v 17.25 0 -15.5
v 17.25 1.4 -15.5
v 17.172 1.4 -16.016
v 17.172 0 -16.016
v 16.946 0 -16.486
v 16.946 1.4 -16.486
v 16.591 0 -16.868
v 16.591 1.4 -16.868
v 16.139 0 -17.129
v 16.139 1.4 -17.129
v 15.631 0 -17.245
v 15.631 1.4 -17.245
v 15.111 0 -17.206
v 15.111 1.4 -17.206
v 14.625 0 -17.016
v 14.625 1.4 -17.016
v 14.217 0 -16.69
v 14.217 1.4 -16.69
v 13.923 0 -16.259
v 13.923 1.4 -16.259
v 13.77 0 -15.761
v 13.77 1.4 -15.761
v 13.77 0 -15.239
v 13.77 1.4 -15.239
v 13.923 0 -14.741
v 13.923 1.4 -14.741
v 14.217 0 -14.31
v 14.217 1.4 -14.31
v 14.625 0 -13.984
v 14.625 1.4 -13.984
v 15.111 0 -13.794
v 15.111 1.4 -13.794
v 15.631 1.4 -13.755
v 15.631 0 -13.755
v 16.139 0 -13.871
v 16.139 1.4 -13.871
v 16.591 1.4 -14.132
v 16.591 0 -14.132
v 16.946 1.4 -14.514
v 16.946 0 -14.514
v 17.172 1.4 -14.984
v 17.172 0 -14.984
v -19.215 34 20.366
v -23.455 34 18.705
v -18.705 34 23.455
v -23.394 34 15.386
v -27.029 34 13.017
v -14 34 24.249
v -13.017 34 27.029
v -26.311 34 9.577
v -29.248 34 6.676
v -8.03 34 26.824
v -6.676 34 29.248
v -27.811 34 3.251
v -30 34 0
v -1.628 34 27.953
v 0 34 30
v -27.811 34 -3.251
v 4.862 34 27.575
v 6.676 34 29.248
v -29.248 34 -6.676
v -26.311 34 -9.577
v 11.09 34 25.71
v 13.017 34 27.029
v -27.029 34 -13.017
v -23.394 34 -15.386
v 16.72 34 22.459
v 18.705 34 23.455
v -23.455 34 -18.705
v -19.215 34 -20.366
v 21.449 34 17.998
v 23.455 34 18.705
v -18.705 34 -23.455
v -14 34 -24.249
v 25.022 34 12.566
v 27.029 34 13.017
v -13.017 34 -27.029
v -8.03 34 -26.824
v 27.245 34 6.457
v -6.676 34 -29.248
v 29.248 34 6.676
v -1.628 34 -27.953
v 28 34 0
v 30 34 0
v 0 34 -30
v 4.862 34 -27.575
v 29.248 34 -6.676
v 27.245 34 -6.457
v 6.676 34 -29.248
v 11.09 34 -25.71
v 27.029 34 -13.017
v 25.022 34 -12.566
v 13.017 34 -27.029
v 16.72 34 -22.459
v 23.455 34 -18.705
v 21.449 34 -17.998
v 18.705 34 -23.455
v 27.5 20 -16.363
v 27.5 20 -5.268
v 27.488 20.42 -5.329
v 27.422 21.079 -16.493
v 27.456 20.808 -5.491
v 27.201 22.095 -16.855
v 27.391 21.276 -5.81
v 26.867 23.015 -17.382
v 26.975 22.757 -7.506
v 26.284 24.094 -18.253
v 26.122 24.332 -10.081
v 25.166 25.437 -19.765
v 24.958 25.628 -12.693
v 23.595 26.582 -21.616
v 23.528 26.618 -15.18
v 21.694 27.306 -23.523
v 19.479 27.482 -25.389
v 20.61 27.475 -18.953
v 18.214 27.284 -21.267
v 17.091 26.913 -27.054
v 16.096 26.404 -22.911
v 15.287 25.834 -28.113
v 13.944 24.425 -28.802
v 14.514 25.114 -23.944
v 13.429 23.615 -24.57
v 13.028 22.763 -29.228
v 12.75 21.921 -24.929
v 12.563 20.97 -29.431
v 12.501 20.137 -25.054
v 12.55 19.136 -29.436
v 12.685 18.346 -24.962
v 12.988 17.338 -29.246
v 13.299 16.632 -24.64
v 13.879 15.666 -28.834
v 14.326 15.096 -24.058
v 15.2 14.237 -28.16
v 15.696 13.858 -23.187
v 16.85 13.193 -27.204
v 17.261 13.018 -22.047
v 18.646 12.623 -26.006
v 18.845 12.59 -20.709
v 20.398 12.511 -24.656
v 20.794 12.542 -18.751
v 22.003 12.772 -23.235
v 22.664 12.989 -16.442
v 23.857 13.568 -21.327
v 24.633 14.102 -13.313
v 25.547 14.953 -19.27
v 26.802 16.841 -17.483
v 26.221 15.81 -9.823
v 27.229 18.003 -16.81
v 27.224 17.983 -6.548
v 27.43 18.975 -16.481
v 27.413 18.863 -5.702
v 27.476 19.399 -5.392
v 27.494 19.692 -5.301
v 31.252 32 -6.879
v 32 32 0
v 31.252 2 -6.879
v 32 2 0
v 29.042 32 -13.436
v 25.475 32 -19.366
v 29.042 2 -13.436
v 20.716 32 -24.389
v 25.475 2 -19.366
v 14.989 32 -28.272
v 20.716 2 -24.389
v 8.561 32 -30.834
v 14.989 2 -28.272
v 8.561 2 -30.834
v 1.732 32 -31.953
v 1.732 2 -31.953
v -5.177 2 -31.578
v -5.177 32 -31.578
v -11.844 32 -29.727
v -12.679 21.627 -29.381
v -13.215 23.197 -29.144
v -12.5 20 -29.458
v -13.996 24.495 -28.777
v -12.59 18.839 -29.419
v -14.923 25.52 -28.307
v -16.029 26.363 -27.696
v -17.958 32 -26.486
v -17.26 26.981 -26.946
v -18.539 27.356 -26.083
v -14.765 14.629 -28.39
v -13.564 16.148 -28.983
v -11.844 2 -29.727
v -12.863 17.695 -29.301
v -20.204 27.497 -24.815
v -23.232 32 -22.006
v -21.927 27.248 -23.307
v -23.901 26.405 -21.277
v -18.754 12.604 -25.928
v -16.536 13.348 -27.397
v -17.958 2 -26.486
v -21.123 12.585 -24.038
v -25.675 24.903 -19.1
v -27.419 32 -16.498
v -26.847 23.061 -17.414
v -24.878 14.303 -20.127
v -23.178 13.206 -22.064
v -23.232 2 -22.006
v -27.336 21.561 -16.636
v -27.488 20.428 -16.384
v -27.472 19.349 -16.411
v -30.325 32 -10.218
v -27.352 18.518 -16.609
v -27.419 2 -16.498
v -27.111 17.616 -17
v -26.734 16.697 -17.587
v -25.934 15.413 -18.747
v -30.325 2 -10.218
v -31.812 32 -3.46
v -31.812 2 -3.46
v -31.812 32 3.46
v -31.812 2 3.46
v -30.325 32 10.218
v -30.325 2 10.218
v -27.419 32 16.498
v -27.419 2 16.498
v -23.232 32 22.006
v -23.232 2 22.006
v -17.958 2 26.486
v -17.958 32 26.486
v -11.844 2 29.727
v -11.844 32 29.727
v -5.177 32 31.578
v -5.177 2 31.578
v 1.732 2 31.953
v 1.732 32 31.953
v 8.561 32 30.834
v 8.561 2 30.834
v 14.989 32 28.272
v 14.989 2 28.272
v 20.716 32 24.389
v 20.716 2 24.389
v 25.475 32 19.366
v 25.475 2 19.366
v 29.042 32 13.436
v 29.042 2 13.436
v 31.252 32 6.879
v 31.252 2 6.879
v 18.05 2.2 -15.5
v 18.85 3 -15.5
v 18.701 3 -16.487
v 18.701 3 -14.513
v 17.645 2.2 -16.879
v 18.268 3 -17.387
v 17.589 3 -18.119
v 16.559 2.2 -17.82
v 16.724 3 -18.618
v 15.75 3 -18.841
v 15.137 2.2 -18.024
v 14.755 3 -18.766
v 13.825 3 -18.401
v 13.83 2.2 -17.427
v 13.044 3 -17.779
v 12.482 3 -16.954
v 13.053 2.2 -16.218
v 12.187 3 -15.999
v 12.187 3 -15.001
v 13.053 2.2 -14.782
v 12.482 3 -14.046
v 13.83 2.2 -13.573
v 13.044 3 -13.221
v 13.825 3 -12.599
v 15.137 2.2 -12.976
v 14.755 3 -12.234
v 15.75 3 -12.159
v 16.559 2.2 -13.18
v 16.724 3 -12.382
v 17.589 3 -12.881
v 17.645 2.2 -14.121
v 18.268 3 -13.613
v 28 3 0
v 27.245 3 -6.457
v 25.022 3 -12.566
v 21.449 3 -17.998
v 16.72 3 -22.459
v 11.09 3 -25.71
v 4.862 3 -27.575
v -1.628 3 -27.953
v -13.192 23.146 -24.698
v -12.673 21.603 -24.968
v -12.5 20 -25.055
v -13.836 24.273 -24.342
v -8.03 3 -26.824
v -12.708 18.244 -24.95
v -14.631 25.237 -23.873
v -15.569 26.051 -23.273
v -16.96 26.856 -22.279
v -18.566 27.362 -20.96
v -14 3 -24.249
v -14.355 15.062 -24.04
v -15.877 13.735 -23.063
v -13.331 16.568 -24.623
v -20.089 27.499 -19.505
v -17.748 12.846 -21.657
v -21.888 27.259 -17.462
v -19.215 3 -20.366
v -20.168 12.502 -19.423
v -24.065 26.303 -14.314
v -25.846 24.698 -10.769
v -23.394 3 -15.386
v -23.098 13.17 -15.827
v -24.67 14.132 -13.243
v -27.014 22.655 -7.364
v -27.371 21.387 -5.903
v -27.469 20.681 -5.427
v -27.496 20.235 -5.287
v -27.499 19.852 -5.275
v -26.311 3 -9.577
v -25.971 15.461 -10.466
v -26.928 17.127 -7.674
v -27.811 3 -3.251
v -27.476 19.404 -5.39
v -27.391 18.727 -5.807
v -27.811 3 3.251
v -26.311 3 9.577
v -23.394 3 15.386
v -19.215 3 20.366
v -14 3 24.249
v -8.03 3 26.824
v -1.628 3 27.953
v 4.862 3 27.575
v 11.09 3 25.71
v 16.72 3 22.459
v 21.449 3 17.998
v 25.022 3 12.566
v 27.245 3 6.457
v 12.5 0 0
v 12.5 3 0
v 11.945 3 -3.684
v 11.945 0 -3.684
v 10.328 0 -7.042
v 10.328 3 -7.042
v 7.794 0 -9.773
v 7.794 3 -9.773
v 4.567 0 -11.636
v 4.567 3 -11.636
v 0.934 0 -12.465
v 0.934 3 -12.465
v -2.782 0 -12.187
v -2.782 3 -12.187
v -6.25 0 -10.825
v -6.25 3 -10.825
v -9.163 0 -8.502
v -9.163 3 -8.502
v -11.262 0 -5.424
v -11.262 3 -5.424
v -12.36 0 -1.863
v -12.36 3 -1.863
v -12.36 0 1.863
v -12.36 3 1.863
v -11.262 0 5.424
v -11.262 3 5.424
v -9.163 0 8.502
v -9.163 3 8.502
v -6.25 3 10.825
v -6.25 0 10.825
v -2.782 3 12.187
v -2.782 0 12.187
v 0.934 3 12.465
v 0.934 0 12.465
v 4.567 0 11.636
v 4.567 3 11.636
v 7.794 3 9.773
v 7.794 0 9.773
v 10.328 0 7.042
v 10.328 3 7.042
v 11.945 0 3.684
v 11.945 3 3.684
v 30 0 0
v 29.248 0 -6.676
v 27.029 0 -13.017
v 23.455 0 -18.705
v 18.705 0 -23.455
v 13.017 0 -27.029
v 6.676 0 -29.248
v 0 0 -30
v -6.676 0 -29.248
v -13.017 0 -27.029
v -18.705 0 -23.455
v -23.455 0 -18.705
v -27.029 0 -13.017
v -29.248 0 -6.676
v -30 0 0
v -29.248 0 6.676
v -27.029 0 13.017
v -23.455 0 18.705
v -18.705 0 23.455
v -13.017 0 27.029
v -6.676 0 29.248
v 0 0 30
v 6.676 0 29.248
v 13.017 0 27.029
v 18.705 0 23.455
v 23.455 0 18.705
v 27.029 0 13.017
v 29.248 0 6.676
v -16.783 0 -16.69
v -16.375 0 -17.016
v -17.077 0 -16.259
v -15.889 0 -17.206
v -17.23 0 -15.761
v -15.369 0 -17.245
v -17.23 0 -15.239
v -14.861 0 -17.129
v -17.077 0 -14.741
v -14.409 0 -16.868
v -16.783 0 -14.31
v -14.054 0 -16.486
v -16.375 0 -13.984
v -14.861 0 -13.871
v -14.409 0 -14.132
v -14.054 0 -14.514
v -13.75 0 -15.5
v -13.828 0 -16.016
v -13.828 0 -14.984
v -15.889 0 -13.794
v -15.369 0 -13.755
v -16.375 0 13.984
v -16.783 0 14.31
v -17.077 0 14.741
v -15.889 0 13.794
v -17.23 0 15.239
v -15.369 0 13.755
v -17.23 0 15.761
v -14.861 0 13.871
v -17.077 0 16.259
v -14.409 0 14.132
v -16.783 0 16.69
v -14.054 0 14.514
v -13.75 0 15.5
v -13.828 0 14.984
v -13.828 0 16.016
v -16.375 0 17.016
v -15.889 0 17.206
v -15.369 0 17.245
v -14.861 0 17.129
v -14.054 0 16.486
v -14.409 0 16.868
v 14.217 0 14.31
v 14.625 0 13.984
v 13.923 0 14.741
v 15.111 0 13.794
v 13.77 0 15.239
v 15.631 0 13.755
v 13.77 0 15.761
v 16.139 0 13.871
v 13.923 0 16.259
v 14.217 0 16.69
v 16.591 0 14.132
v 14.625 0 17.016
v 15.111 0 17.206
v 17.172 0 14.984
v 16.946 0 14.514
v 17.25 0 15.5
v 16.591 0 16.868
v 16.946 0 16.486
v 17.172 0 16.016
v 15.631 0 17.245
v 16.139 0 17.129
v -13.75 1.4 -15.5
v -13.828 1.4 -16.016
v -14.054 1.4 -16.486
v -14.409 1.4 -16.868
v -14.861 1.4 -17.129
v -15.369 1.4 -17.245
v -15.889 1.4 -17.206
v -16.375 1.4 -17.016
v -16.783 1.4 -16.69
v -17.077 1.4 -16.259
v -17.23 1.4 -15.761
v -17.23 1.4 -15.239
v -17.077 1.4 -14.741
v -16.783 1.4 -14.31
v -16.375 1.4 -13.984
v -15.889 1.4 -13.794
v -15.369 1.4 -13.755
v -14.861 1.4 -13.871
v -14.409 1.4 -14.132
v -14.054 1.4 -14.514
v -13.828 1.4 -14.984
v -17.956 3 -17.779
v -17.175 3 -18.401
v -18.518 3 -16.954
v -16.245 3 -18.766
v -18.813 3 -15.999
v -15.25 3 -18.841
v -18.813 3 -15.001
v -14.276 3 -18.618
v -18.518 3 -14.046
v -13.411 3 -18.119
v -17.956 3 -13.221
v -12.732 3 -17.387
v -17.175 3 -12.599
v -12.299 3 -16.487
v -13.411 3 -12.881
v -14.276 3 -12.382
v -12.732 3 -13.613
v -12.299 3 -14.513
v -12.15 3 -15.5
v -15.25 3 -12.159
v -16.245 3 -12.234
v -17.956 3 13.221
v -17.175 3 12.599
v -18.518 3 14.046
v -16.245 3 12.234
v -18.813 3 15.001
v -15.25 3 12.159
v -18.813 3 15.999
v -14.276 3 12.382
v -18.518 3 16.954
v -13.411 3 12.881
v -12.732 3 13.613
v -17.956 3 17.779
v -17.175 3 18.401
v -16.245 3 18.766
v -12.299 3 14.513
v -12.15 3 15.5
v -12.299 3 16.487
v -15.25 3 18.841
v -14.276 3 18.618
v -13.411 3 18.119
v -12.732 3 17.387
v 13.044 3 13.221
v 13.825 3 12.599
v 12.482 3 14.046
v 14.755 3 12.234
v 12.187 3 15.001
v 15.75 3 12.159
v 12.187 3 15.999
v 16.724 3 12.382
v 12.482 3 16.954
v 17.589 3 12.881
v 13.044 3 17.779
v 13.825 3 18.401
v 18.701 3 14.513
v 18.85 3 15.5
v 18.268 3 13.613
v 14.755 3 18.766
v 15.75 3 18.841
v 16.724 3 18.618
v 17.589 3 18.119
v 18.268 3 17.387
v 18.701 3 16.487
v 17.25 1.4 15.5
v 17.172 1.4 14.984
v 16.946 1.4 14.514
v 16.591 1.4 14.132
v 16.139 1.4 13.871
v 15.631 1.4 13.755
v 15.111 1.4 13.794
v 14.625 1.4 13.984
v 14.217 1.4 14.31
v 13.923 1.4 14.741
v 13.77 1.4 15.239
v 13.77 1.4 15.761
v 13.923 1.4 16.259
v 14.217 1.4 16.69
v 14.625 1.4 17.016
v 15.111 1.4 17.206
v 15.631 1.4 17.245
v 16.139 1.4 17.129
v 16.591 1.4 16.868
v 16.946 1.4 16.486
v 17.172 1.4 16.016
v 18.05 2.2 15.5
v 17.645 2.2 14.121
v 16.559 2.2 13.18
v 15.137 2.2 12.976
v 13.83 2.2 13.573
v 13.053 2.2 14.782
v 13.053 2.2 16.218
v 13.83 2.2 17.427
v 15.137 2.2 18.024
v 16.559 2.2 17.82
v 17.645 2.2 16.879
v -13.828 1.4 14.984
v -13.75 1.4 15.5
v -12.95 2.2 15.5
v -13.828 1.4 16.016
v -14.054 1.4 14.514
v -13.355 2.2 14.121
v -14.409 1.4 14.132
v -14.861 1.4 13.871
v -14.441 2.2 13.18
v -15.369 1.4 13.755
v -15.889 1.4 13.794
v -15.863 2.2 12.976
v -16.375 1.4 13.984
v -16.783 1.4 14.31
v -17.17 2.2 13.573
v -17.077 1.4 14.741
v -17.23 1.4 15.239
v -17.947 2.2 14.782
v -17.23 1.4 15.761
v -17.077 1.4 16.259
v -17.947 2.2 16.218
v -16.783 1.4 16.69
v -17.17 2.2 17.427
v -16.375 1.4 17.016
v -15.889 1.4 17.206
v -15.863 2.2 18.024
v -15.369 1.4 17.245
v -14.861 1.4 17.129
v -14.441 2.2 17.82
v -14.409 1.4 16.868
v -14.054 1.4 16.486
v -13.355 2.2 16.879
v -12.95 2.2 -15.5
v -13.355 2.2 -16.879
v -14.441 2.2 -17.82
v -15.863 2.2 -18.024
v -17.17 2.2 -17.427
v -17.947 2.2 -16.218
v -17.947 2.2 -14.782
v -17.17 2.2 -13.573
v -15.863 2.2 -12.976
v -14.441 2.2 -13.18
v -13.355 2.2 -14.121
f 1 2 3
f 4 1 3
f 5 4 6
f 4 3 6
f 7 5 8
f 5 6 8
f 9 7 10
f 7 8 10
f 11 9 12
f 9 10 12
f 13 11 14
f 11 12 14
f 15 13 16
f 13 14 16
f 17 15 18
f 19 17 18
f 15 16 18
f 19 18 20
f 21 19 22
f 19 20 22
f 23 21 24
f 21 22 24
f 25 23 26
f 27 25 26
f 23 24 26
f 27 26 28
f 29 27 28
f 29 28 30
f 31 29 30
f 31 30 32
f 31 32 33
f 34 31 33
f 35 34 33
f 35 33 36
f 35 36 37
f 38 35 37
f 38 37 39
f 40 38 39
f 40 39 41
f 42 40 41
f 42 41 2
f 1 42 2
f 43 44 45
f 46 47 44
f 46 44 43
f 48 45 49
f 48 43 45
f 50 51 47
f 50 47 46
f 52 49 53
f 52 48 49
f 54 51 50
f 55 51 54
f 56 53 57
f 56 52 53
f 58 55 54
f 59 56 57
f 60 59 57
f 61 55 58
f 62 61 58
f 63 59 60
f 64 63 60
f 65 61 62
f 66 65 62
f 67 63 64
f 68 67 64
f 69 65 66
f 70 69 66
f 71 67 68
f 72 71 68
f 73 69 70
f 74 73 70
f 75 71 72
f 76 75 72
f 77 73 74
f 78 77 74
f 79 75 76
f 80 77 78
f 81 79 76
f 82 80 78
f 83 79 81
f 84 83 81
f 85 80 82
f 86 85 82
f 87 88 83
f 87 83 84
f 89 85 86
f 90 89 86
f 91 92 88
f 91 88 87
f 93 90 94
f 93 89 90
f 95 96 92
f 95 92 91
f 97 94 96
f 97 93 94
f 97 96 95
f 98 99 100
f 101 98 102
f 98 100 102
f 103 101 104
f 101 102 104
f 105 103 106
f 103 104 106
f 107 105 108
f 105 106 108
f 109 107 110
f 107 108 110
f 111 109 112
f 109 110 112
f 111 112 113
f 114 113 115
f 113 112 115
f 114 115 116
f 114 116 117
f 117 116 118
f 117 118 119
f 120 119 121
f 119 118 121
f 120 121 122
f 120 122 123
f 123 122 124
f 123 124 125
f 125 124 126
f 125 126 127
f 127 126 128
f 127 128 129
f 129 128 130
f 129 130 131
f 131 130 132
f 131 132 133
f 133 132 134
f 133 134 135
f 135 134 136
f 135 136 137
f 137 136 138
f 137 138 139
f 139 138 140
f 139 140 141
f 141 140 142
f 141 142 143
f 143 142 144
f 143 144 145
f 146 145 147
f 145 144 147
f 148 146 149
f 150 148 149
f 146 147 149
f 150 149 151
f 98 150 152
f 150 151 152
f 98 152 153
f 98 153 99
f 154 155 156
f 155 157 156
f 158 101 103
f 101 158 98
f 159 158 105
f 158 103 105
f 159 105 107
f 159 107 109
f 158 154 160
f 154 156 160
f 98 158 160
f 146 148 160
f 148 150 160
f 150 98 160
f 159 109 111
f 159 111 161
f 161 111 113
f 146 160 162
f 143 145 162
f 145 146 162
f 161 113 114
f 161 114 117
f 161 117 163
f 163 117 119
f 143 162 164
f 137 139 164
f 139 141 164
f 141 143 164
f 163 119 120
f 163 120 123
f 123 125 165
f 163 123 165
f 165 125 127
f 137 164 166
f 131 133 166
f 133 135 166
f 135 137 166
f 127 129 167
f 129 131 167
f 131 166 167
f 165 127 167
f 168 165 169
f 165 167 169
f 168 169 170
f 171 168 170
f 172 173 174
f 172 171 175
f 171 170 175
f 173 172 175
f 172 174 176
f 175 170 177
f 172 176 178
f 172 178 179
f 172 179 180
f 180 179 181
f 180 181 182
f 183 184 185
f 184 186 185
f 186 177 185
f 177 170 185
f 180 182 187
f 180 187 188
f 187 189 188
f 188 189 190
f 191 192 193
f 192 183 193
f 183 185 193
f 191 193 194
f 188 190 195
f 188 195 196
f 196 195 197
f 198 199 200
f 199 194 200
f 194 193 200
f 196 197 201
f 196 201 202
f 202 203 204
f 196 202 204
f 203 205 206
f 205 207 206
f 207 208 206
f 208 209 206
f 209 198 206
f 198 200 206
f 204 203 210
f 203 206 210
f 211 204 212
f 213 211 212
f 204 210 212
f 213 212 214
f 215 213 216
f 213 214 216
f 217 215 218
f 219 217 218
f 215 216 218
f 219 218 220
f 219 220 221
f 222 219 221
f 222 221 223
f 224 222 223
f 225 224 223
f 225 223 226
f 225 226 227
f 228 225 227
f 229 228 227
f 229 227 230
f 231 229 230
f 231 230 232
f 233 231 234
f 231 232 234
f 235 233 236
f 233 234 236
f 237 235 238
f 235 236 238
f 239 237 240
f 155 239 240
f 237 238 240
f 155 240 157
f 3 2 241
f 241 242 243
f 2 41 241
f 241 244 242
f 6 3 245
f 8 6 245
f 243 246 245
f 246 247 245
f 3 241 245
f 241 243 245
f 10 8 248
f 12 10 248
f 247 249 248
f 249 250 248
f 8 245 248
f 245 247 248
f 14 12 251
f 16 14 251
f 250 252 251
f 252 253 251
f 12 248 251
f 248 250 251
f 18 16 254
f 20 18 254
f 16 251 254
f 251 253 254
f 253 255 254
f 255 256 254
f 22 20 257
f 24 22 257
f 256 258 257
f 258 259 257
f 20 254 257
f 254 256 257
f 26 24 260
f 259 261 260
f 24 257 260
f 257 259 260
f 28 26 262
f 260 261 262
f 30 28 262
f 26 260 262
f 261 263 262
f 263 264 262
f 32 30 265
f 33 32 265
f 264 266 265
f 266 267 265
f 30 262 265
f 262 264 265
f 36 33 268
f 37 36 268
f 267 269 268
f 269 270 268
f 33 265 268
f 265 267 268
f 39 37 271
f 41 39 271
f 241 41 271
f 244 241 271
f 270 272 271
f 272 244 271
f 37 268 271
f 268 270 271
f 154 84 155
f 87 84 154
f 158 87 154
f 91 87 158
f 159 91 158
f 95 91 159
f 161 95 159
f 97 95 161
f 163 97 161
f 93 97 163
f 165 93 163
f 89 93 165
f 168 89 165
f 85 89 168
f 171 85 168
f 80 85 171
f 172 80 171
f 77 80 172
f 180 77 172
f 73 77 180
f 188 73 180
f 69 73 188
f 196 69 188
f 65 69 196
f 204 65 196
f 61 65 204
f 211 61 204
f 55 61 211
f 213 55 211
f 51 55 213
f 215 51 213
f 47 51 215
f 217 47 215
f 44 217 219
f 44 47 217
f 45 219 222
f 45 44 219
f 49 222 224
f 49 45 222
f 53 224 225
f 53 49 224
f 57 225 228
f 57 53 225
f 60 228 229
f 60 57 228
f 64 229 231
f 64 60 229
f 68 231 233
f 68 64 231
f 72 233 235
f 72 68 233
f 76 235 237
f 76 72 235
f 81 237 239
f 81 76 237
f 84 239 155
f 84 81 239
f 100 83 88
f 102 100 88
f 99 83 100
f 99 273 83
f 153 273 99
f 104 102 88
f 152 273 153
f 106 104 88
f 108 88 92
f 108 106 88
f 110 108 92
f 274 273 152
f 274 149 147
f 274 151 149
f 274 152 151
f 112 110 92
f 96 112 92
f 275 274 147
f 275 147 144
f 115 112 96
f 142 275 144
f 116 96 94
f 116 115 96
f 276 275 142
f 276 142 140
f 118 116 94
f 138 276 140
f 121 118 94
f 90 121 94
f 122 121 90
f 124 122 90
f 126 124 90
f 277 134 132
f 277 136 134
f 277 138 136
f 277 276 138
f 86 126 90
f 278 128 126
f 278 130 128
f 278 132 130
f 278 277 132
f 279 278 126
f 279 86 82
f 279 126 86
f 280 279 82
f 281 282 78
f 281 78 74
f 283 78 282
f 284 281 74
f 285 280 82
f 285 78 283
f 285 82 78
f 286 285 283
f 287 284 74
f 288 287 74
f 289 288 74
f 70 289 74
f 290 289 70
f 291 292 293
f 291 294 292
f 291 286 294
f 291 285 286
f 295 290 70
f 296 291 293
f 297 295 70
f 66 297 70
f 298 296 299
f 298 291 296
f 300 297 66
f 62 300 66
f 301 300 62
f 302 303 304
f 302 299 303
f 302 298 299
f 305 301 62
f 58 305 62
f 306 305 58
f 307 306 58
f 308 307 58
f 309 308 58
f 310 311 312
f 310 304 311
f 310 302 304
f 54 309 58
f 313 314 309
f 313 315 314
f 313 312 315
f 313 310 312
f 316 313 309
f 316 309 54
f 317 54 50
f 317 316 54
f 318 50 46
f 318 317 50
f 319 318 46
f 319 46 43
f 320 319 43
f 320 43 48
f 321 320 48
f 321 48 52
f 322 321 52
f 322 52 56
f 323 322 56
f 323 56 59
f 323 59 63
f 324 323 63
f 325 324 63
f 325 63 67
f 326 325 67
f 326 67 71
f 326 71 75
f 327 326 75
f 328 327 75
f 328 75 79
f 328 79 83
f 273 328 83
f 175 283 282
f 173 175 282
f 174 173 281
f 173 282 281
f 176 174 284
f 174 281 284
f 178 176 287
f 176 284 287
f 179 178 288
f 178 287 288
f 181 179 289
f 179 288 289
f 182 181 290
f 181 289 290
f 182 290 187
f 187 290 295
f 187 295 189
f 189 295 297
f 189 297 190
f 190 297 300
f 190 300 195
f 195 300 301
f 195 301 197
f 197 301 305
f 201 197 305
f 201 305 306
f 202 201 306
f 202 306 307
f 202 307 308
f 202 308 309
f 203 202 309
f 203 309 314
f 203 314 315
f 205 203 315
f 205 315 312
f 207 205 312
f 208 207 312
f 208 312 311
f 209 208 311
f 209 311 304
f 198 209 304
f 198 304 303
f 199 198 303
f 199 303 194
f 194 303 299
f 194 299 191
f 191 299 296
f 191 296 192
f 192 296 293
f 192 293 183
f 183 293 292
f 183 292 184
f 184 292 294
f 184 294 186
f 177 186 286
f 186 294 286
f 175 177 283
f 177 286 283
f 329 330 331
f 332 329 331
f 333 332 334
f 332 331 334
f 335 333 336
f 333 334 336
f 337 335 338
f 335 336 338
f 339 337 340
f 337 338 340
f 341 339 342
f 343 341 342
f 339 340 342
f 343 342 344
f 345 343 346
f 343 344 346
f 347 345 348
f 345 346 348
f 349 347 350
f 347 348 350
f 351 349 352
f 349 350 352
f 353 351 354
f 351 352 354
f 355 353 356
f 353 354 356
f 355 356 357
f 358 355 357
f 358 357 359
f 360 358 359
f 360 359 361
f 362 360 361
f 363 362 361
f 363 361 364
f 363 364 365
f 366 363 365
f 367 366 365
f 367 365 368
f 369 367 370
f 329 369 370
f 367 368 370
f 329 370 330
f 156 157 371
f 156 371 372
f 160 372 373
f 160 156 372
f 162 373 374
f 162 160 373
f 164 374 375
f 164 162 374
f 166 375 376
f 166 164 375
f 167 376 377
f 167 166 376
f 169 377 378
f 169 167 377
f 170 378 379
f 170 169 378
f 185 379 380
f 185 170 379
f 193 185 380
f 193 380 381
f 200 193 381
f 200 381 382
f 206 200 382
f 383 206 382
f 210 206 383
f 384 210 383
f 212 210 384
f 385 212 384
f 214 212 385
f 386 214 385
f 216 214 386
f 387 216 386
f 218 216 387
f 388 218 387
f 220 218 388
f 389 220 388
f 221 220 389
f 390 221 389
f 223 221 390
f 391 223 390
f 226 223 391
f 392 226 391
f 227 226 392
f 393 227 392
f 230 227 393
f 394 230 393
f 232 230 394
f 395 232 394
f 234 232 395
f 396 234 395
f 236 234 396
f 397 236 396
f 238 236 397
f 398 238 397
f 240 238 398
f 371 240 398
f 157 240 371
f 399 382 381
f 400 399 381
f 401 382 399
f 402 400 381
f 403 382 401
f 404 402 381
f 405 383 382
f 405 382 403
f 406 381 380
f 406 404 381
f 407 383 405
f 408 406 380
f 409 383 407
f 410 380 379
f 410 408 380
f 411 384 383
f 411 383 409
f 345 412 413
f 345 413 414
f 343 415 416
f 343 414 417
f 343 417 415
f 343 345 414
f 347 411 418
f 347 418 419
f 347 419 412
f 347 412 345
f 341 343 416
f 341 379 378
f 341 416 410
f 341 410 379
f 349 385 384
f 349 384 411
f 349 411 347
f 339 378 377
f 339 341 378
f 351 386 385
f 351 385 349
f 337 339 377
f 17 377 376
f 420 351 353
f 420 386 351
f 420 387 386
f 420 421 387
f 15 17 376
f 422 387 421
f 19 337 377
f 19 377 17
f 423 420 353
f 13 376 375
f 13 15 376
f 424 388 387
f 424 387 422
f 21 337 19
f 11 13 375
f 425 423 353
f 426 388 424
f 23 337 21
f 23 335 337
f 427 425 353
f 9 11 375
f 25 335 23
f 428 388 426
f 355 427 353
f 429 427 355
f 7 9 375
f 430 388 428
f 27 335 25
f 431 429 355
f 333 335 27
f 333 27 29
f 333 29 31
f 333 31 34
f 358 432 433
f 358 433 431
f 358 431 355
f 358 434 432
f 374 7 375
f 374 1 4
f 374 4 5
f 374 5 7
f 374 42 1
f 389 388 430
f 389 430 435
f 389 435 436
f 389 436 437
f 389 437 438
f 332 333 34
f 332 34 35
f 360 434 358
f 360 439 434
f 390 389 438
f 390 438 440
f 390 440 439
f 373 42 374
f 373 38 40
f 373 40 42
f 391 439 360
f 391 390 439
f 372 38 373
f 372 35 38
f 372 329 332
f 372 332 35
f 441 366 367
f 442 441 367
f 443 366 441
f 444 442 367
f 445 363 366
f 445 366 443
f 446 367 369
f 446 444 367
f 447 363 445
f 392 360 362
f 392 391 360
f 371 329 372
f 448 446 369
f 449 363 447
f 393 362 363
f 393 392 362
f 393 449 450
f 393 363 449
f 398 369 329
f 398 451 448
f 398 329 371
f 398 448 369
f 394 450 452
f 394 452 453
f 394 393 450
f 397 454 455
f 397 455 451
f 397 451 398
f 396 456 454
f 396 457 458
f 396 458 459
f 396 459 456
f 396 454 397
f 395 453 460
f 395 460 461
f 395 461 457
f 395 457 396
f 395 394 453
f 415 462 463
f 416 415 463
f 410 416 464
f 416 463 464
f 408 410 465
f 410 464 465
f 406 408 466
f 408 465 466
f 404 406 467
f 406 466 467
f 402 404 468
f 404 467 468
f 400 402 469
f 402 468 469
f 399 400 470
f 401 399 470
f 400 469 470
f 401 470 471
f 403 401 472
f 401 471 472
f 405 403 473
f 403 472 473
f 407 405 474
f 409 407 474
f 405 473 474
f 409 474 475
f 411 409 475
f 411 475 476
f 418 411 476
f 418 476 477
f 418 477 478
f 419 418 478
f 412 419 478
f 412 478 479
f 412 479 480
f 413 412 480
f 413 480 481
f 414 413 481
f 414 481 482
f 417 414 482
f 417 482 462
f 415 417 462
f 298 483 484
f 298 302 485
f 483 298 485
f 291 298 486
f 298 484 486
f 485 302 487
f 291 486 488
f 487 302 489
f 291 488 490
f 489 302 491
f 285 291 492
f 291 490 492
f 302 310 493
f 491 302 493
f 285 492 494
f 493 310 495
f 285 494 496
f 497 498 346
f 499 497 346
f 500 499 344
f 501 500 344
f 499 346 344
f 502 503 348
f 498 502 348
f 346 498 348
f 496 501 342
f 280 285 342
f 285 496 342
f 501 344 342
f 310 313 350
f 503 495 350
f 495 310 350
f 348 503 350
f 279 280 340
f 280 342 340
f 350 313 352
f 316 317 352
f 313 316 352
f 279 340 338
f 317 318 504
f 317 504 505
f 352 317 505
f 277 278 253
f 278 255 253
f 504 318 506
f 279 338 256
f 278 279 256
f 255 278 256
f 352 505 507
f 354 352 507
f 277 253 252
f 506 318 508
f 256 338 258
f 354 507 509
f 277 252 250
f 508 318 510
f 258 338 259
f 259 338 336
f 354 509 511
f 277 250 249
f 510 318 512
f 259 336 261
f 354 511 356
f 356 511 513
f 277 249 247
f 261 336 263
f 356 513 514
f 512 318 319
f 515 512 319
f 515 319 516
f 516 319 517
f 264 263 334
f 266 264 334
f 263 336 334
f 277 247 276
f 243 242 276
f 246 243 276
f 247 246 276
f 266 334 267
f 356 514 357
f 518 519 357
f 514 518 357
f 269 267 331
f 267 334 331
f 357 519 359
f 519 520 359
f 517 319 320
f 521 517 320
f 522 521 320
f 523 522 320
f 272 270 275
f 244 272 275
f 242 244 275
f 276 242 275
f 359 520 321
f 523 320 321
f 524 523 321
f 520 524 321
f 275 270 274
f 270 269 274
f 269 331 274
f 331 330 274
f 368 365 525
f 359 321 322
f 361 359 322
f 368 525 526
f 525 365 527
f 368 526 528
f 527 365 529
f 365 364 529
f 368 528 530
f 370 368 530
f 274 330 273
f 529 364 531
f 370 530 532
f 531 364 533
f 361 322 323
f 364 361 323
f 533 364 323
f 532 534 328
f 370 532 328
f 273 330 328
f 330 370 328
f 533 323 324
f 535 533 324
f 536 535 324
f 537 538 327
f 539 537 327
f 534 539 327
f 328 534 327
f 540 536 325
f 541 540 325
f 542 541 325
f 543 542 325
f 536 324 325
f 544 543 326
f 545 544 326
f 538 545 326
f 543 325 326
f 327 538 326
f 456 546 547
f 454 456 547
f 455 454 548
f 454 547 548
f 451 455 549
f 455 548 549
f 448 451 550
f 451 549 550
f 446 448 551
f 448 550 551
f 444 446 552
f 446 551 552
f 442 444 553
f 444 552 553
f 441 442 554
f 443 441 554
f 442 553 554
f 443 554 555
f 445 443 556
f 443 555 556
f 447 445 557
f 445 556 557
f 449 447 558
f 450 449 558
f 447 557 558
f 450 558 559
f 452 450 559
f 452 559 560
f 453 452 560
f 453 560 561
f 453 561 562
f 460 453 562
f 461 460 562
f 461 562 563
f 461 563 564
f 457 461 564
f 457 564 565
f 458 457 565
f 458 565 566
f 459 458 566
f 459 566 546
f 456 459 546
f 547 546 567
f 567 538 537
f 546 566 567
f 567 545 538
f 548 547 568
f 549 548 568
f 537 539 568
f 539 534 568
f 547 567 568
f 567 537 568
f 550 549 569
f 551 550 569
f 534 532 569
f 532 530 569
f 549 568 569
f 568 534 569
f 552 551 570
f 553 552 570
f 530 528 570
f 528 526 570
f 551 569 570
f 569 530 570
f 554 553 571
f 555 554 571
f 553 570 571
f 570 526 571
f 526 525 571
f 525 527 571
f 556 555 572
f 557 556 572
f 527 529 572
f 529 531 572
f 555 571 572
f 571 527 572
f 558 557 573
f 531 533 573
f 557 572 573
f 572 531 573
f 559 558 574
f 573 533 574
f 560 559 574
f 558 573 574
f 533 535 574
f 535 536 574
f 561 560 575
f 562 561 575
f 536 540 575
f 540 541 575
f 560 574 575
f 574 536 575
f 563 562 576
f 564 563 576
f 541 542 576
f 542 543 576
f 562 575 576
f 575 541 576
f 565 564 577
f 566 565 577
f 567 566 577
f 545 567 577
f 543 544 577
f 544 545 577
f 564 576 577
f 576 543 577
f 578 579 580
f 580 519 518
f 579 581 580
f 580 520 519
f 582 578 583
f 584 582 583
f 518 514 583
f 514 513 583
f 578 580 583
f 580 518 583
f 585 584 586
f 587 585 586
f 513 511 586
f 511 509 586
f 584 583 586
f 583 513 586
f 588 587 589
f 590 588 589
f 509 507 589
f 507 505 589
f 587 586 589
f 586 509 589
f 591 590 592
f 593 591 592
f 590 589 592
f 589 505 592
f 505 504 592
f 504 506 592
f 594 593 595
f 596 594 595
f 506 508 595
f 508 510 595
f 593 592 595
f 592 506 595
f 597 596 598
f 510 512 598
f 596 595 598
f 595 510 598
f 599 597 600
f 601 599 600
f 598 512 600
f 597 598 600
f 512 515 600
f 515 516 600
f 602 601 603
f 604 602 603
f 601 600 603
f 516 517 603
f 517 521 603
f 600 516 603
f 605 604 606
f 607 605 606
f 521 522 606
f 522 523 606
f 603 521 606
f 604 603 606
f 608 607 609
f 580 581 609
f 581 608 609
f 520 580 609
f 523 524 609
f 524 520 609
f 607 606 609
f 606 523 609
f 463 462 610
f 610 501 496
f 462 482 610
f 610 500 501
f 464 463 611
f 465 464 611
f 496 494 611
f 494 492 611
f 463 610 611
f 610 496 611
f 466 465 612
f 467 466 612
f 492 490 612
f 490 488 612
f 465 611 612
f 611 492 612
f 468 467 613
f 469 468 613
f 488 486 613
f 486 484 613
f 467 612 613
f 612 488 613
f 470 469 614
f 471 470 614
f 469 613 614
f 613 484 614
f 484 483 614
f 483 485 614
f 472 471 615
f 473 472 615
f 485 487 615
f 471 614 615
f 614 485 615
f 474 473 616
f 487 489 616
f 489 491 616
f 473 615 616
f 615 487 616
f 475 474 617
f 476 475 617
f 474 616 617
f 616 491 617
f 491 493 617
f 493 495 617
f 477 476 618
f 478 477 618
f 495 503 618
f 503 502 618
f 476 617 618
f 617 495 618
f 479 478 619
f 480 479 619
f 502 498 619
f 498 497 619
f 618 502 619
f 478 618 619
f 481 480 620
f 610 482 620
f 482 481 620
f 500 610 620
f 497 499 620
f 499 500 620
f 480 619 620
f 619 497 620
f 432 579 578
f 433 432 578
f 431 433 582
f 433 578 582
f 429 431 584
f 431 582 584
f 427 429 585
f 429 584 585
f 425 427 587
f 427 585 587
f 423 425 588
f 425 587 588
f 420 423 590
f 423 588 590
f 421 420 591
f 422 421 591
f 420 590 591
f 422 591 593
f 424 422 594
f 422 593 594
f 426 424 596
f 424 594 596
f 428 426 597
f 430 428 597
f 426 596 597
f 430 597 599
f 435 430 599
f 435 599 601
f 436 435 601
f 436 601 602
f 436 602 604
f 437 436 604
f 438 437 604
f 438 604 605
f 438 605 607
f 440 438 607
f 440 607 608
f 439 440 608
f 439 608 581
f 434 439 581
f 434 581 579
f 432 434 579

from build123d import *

# Parameters (mm, degrees)
SKETCH2_R           = 32
SKETCH2_R_2         = 28
BOSS_EXTRUDE1_DEPTH = 34
SKETCH3_R           = 28
BOSS_EXTRUDE2_DEPTH = 3
SKETCH4_R           = 12.5
CUT_EXTRUDE1_DEPTH  = 3
SKETCH5_R           = 2.6
SKETCH5_R_2         = 1.75
CUT_EXTRUDE2_DEPTH  = 4
CHAMFER1_SIZE       = 1.6
CHAMFER2_SIZE       = 2
CHAMFER3_SIZE       = 2
SKETCH7_R           = 7.5
CUT_EXTRUDE4_DEPTH  = 33


with BuildPart() as part:
    # Sketch2 → Boss-Extrude1 (new body)
    with BuildSketch(Plane(origin=(0, 0, 0), x_dir=(1, 0, 0), z_dir=(0, 1, 0))):
        Circle(SKETCH2_R)
        Circle(SKETCH2_R_2, mode=Mode.SUBTRACT)
    extrude(amount=BOSS_EXTRUDE1_DEPTH)

    # Sketch3 → Boss-Extrude2 (add)
    with BuildSketch(Plane.XZ):
        Circle(SKETCH3_R)
    extrude(amount=-BOSS_EXTRUDE2_DEPTH)

    # Sketch4 → Cut-Extrude1 (cut)
    with BuildSketch(Plane(origin=(0, 3, 0), x_dir=(1, 0, 0), z_dir=(0, 1, 0))):
        Circle(SKETCH4_R)
    extrude(amount=-CUT_EXTRUDE1_DEPTH, mode=Mode.SUBTRACT)

    # Sketch5 → Cut-Extrude2 (cut, through all)
    with BuildSketch(Plane(origin=(0, 3, 0), x_dir=(1, 0, 0), z_dir=(0, 1, 0))):
        Circle(SKETCH5_R)
        with Locations((-15.5, 15.5)):
            Circle(SKETCH5_R_2)
        with Locations((15.5, 15.5)):
            Circle(SKETCH5_R_2)
        with Locations((-15.5, -15.5)):
            Circle(SKETCH5_R_2)
        with Locations((15.5, -15.5)):
            Circle(SKETCH5_R_2)
    extrude(amount=-CUT_EXTRUDE2_DEPTH, mode=Mode.SUBTRACT)

    # Chamfer1
    chamfer1_edges = [part.edges().sort_by_distance(p)[0] for p in [
        (13.75, 3, 15.5),
        (-17.25, 3, 15.5),
        (13.75, 3, -15.5),
        (-17.25, 3, -15.5),
    ]]
    chamfer(chamfer1_edges, length=CHAMFER1_SIZE)

    # Chamfer2
    chamfer2_edges = [part.edges().sort_by_distance(p)[0] for p in [
        (-32, 0, 0),
    ]]
    chamfer(chamfer2_edges, length=CHAMFER2_SIZE)

    # Chamfer3
    chamfer3_edges = [part.edges().sort_by_distance(p)[0] for p in [
        (-32, 34, 0),
    ]]
    chamfer(chamfer3_edges, length=CHAMFER3_SIZE)

    # Sketch7 → Cut-Extrude4 (cut, through all)
    with BuildSketch(Plane.XY):
        with Locations((-20, 20)):
            Circle(SKETCH7_R)
        with Locations((20, 20)):
            Circle(SKETCH7_R)
    extrude(amount=-CUT_EXTRUDE4_DEPTH, mode=Mode.SUBTRACT)


solid = part.part
